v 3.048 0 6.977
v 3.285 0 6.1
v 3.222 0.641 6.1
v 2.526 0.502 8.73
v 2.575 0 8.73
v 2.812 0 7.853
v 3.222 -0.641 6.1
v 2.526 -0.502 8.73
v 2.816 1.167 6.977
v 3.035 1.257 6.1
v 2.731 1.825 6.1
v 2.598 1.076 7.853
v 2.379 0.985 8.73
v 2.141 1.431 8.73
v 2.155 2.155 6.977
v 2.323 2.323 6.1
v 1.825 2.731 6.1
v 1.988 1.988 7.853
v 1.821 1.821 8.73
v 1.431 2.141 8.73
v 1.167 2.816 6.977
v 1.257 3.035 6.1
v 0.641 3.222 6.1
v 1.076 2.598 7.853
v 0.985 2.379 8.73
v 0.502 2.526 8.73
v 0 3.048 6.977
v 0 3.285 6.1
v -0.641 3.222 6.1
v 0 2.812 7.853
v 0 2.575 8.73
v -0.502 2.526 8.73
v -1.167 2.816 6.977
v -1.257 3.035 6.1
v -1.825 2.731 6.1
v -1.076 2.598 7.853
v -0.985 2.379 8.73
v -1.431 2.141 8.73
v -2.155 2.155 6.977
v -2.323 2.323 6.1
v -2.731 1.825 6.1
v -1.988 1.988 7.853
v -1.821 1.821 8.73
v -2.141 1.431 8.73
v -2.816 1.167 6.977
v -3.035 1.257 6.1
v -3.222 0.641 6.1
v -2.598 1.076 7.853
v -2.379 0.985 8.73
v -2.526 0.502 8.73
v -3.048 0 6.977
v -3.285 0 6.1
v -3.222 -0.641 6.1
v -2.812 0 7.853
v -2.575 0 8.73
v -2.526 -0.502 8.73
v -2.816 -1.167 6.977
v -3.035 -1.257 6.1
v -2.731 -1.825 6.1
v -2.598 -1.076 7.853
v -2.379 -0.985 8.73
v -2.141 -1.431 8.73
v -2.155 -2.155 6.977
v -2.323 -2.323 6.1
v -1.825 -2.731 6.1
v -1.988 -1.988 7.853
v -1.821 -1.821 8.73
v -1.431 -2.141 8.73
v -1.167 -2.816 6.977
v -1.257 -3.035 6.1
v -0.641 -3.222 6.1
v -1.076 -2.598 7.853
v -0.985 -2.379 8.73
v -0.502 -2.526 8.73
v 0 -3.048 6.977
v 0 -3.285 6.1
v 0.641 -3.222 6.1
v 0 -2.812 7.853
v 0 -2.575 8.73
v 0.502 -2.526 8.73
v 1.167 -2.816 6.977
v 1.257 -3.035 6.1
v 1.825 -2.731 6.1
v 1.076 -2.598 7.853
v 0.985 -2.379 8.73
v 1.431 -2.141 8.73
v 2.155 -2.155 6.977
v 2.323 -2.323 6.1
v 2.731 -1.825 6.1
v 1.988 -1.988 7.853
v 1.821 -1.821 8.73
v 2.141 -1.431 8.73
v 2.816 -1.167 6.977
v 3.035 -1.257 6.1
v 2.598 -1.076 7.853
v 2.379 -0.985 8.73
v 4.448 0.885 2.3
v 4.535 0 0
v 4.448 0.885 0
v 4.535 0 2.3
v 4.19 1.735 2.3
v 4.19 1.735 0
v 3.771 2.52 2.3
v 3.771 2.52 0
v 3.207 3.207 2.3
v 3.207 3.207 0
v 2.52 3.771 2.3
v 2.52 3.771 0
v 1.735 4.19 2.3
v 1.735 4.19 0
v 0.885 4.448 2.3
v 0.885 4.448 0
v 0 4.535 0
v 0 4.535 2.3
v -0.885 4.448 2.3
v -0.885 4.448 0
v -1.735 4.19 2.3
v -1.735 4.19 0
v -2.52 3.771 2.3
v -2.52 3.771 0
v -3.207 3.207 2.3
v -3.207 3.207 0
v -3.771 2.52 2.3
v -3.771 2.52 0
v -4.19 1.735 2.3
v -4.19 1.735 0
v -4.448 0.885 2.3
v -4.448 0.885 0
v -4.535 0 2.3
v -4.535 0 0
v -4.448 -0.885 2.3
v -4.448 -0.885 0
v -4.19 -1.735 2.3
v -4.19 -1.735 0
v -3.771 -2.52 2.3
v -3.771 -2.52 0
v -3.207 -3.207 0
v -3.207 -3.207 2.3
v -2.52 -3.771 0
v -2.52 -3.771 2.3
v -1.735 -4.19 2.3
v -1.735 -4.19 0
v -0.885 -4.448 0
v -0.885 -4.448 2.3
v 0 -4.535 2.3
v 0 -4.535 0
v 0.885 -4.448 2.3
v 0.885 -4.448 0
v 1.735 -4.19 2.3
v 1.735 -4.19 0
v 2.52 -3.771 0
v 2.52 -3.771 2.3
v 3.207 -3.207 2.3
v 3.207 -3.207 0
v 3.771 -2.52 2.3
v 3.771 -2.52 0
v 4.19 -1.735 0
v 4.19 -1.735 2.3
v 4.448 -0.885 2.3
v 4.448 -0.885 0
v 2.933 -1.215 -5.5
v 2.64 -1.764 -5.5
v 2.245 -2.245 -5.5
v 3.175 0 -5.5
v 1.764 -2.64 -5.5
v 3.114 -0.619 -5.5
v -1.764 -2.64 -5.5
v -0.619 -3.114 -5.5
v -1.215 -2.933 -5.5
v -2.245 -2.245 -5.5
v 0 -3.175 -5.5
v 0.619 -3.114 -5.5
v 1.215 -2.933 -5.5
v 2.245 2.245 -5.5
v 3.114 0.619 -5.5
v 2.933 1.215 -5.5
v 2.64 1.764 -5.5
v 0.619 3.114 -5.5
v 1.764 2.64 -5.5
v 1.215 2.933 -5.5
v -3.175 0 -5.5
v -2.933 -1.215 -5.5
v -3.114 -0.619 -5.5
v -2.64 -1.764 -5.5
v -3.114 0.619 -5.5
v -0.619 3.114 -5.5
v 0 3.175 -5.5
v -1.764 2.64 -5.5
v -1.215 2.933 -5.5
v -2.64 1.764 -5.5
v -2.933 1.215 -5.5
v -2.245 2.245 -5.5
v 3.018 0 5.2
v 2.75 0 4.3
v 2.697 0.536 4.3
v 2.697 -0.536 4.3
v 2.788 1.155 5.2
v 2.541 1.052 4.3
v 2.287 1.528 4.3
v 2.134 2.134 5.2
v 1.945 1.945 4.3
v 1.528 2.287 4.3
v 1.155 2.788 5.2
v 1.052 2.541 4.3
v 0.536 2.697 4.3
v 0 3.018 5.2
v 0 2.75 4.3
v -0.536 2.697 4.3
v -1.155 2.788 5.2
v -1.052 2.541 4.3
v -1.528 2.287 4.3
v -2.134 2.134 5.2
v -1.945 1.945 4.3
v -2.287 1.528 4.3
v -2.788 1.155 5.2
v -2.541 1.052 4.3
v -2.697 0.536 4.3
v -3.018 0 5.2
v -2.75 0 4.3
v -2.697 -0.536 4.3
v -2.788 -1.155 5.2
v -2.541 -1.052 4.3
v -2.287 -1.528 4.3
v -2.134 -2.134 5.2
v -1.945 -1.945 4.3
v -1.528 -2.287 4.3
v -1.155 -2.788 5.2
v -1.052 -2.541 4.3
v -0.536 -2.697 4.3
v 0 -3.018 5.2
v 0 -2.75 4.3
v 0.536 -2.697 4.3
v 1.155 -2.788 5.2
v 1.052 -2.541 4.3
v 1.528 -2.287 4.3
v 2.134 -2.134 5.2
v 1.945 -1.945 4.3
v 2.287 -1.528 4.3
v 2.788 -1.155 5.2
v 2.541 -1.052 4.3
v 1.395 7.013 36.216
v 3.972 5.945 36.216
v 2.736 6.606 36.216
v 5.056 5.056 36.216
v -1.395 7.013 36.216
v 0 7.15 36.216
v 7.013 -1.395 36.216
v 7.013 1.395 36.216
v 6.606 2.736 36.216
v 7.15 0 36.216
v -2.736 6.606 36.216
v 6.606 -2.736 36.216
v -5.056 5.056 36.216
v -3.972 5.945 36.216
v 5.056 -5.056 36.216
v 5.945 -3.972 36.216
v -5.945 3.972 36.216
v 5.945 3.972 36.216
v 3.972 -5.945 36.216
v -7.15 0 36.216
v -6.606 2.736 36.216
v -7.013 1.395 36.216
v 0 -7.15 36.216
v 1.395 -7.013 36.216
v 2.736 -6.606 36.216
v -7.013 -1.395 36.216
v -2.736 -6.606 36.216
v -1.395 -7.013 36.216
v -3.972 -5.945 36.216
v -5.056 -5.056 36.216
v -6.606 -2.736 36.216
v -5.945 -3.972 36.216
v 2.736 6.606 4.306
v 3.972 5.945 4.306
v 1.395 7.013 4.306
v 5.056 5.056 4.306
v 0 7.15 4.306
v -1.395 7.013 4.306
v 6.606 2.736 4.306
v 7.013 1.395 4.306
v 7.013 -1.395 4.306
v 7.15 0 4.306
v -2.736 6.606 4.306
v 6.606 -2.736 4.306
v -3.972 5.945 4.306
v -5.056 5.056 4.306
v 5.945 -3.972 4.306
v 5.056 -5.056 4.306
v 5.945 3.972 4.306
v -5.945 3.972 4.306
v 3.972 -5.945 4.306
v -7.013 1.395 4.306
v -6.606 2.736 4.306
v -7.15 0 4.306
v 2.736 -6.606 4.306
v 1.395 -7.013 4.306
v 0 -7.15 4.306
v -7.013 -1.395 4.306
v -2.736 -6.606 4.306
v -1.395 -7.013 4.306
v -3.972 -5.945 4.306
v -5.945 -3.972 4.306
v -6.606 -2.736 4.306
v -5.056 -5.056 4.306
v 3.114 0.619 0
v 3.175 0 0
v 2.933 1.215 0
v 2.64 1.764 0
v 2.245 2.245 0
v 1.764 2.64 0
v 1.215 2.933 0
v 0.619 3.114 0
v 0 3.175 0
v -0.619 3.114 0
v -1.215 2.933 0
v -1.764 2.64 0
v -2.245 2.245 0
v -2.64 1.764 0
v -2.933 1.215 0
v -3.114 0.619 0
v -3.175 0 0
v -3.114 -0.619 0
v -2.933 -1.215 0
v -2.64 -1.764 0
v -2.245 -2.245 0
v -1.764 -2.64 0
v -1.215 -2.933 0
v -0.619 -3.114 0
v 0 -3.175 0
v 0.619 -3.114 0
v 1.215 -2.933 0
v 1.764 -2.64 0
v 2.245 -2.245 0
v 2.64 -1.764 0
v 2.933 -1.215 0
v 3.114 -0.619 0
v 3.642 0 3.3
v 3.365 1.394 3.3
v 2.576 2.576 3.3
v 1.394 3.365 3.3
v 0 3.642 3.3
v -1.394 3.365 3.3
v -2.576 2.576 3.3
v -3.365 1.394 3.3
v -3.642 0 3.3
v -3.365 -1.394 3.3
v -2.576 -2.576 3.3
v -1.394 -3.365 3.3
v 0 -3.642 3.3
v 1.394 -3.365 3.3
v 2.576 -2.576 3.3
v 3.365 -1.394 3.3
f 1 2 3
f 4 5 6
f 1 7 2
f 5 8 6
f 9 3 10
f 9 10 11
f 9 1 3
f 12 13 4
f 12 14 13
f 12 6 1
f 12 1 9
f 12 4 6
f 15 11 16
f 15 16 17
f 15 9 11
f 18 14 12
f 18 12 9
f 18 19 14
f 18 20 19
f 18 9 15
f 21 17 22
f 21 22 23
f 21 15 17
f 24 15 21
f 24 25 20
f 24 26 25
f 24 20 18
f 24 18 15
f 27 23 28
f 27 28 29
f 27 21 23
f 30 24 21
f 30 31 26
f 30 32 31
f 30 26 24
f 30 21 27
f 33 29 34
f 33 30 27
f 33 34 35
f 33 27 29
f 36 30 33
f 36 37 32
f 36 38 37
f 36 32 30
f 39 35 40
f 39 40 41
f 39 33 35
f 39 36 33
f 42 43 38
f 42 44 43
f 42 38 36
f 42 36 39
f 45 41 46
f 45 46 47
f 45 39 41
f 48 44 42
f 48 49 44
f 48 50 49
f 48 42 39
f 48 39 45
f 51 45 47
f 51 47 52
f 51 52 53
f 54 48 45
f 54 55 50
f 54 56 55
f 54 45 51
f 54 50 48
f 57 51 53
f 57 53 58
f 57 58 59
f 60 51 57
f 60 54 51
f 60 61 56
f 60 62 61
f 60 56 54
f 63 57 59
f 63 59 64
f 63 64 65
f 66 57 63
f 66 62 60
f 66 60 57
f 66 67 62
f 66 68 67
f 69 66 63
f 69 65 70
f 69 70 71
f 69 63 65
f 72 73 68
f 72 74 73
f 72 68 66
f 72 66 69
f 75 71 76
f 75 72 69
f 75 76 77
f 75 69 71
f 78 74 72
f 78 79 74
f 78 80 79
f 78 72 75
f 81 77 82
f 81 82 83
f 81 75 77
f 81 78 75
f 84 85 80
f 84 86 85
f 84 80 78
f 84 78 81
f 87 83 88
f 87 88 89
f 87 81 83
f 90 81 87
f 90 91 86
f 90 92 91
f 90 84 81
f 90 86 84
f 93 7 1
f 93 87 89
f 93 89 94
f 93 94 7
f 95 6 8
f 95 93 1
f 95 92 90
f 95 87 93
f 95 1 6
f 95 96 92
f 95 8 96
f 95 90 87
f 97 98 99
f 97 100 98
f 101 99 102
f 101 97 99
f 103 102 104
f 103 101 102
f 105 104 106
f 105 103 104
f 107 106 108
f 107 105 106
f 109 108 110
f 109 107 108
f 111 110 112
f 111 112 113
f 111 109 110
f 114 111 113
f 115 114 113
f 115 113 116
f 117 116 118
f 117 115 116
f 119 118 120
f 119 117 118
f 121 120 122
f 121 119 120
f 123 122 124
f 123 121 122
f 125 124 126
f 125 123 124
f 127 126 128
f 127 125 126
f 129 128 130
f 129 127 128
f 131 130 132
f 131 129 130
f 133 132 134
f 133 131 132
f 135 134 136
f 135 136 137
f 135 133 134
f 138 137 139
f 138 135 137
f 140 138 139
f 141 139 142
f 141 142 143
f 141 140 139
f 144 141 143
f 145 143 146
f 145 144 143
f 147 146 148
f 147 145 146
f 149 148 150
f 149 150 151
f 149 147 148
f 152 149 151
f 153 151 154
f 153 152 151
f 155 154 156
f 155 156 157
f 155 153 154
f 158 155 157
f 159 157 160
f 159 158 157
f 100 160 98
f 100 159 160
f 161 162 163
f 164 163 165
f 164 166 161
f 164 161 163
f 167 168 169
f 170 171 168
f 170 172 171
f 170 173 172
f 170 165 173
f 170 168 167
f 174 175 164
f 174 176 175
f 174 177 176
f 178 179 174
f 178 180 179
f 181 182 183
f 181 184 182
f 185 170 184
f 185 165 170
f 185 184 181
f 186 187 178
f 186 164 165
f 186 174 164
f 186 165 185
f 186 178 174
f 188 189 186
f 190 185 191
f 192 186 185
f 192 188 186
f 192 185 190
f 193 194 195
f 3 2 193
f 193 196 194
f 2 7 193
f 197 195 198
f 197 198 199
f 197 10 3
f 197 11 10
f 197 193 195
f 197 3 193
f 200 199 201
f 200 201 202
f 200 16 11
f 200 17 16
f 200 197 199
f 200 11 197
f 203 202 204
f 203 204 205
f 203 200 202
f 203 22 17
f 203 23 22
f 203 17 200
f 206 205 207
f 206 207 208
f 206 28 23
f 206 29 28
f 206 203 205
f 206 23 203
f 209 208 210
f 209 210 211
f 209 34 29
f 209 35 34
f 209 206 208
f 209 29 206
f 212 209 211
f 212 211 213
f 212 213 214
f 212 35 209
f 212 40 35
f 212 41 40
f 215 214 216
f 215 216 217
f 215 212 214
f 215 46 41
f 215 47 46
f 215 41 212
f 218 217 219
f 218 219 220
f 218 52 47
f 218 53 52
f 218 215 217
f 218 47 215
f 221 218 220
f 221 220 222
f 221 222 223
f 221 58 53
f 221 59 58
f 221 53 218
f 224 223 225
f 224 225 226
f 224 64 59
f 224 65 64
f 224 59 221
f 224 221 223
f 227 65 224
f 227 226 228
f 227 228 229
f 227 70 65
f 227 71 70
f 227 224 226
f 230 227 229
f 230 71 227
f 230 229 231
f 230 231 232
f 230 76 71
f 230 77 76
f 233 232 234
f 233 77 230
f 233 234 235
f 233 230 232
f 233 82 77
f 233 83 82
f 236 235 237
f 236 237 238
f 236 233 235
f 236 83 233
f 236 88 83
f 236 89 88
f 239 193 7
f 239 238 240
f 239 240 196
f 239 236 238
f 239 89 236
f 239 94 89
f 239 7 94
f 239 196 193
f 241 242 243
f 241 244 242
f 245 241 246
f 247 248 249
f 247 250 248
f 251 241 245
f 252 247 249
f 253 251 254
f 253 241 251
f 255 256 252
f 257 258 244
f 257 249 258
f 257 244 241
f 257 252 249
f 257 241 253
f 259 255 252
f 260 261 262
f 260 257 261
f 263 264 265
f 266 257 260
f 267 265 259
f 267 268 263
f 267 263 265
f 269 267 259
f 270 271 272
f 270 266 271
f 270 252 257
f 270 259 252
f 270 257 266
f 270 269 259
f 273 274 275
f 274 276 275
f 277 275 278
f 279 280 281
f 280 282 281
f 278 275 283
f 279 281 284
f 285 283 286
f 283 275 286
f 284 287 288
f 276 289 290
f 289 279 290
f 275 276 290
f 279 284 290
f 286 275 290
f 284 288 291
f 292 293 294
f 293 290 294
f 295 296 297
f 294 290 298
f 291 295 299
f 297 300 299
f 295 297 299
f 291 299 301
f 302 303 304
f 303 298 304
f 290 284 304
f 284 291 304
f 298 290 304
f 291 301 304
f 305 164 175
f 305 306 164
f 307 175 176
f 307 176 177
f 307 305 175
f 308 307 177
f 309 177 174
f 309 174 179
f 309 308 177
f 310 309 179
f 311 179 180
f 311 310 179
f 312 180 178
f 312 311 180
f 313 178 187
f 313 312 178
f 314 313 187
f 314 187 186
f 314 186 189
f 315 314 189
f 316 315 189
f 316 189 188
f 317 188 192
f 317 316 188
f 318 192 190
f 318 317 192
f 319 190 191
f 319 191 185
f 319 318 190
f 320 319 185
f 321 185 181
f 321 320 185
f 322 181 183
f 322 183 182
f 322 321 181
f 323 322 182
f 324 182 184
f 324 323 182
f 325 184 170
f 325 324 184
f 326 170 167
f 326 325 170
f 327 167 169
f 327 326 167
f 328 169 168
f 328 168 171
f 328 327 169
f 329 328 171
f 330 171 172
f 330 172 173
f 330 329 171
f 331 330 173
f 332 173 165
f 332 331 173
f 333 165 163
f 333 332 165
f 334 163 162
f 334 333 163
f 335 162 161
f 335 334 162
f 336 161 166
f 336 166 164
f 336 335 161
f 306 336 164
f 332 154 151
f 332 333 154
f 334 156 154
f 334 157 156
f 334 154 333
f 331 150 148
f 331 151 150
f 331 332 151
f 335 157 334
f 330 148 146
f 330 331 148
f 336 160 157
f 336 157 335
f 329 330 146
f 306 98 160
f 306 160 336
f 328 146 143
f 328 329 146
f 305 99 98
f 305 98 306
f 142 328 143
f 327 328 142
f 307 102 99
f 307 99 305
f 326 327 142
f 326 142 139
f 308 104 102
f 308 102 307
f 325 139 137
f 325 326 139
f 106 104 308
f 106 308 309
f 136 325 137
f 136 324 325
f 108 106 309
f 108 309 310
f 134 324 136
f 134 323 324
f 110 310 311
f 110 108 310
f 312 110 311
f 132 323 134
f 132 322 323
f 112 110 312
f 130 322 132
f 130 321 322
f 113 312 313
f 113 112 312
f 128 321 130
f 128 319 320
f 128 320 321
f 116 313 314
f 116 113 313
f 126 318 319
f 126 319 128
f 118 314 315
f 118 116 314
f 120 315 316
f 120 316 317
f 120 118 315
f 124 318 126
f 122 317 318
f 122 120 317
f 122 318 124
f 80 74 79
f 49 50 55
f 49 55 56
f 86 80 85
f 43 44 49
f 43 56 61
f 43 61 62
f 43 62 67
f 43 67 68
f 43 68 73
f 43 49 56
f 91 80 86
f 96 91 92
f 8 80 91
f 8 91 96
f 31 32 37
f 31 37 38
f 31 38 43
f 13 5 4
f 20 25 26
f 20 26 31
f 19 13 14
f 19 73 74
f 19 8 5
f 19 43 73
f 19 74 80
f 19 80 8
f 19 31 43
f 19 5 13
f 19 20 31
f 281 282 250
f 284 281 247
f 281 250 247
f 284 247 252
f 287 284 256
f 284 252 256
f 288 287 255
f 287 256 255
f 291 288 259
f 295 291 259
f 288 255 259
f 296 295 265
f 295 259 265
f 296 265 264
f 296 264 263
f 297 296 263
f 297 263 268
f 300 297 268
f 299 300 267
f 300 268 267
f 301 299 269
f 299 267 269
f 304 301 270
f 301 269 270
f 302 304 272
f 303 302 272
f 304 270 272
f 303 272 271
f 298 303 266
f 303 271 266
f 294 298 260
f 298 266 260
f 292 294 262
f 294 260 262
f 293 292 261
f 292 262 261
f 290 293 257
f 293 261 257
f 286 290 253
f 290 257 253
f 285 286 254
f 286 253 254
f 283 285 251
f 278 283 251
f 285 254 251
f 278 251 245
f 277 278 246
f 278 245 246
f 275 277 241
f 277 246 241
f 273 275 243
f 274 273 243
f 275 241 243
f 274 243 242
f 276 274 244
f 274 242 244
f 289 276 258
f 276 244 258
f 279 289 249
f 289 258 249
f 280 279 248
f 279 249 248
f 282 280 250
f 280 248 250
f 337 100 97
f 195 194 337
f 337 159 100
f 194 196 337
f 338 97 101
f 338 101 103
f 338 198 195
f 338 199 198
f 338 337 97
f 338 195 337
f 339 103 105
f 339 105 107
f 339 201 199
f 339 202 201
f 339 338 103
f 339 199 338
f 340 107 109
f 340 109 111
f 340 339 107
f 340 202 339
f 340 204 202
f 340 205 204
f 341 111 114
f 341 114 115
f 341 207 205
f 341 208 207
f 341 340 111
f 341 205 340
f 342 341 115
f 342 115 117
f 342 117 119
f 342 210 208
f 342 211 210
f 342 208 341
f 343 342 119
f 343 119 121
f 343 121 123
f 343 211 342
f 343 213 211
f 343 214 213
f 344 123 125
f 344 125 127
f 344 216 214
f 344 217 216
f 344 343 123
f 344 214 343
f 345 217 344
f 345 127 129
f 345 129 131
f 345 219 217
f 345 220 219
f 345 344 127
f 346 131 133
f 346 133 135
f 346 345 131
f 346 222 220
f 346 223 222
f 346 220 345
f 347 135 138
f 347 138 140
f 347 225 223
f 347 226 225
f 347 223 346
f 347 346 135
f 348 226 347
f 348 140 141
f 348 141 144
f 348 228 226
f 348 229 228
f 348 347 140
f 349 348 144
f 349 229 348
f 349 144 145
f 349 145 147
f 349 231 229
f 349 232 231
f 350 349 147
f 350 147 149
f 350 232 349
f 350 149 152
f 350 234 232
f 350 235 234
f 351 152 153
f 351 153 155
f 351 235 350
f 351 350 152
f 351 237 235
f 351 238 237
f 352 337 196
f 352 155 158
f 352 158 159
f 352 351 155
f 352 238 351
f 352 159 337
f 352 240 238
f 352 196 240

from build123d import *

# Parameters (mm, degrees)
F2_W = 7.15
F2_H = 31.909382


with BuildPart() as f1:
    # F0 (on Front) → F1 (revolve)
    with BuildSketch(Plane.XZ):
        Polygon((2.575, 8.73), (0, 8.73), (0, -5.5), (3.175, -5.5), (3.175, 0), (4.535, 0), (4.535, 2.3), (2.75, 4.3), (3.285, 6.1), align=None)
    revolve(axis=Axis((0, 0, 1.615), (0, 0, 1)))


with BuildPart() as f3:
    # F2 (on Front) → F3 (revolve)
    with BuildSketch(Plane.XZ):
        with Locations((3.575, 20.261078)):
            Rectangle(F2_W, F2_H)
    revolve(axis=Axis((0, 0, 20.261078), (0, 0, -1)))


solid = Compound([f1.part, f3.part])
